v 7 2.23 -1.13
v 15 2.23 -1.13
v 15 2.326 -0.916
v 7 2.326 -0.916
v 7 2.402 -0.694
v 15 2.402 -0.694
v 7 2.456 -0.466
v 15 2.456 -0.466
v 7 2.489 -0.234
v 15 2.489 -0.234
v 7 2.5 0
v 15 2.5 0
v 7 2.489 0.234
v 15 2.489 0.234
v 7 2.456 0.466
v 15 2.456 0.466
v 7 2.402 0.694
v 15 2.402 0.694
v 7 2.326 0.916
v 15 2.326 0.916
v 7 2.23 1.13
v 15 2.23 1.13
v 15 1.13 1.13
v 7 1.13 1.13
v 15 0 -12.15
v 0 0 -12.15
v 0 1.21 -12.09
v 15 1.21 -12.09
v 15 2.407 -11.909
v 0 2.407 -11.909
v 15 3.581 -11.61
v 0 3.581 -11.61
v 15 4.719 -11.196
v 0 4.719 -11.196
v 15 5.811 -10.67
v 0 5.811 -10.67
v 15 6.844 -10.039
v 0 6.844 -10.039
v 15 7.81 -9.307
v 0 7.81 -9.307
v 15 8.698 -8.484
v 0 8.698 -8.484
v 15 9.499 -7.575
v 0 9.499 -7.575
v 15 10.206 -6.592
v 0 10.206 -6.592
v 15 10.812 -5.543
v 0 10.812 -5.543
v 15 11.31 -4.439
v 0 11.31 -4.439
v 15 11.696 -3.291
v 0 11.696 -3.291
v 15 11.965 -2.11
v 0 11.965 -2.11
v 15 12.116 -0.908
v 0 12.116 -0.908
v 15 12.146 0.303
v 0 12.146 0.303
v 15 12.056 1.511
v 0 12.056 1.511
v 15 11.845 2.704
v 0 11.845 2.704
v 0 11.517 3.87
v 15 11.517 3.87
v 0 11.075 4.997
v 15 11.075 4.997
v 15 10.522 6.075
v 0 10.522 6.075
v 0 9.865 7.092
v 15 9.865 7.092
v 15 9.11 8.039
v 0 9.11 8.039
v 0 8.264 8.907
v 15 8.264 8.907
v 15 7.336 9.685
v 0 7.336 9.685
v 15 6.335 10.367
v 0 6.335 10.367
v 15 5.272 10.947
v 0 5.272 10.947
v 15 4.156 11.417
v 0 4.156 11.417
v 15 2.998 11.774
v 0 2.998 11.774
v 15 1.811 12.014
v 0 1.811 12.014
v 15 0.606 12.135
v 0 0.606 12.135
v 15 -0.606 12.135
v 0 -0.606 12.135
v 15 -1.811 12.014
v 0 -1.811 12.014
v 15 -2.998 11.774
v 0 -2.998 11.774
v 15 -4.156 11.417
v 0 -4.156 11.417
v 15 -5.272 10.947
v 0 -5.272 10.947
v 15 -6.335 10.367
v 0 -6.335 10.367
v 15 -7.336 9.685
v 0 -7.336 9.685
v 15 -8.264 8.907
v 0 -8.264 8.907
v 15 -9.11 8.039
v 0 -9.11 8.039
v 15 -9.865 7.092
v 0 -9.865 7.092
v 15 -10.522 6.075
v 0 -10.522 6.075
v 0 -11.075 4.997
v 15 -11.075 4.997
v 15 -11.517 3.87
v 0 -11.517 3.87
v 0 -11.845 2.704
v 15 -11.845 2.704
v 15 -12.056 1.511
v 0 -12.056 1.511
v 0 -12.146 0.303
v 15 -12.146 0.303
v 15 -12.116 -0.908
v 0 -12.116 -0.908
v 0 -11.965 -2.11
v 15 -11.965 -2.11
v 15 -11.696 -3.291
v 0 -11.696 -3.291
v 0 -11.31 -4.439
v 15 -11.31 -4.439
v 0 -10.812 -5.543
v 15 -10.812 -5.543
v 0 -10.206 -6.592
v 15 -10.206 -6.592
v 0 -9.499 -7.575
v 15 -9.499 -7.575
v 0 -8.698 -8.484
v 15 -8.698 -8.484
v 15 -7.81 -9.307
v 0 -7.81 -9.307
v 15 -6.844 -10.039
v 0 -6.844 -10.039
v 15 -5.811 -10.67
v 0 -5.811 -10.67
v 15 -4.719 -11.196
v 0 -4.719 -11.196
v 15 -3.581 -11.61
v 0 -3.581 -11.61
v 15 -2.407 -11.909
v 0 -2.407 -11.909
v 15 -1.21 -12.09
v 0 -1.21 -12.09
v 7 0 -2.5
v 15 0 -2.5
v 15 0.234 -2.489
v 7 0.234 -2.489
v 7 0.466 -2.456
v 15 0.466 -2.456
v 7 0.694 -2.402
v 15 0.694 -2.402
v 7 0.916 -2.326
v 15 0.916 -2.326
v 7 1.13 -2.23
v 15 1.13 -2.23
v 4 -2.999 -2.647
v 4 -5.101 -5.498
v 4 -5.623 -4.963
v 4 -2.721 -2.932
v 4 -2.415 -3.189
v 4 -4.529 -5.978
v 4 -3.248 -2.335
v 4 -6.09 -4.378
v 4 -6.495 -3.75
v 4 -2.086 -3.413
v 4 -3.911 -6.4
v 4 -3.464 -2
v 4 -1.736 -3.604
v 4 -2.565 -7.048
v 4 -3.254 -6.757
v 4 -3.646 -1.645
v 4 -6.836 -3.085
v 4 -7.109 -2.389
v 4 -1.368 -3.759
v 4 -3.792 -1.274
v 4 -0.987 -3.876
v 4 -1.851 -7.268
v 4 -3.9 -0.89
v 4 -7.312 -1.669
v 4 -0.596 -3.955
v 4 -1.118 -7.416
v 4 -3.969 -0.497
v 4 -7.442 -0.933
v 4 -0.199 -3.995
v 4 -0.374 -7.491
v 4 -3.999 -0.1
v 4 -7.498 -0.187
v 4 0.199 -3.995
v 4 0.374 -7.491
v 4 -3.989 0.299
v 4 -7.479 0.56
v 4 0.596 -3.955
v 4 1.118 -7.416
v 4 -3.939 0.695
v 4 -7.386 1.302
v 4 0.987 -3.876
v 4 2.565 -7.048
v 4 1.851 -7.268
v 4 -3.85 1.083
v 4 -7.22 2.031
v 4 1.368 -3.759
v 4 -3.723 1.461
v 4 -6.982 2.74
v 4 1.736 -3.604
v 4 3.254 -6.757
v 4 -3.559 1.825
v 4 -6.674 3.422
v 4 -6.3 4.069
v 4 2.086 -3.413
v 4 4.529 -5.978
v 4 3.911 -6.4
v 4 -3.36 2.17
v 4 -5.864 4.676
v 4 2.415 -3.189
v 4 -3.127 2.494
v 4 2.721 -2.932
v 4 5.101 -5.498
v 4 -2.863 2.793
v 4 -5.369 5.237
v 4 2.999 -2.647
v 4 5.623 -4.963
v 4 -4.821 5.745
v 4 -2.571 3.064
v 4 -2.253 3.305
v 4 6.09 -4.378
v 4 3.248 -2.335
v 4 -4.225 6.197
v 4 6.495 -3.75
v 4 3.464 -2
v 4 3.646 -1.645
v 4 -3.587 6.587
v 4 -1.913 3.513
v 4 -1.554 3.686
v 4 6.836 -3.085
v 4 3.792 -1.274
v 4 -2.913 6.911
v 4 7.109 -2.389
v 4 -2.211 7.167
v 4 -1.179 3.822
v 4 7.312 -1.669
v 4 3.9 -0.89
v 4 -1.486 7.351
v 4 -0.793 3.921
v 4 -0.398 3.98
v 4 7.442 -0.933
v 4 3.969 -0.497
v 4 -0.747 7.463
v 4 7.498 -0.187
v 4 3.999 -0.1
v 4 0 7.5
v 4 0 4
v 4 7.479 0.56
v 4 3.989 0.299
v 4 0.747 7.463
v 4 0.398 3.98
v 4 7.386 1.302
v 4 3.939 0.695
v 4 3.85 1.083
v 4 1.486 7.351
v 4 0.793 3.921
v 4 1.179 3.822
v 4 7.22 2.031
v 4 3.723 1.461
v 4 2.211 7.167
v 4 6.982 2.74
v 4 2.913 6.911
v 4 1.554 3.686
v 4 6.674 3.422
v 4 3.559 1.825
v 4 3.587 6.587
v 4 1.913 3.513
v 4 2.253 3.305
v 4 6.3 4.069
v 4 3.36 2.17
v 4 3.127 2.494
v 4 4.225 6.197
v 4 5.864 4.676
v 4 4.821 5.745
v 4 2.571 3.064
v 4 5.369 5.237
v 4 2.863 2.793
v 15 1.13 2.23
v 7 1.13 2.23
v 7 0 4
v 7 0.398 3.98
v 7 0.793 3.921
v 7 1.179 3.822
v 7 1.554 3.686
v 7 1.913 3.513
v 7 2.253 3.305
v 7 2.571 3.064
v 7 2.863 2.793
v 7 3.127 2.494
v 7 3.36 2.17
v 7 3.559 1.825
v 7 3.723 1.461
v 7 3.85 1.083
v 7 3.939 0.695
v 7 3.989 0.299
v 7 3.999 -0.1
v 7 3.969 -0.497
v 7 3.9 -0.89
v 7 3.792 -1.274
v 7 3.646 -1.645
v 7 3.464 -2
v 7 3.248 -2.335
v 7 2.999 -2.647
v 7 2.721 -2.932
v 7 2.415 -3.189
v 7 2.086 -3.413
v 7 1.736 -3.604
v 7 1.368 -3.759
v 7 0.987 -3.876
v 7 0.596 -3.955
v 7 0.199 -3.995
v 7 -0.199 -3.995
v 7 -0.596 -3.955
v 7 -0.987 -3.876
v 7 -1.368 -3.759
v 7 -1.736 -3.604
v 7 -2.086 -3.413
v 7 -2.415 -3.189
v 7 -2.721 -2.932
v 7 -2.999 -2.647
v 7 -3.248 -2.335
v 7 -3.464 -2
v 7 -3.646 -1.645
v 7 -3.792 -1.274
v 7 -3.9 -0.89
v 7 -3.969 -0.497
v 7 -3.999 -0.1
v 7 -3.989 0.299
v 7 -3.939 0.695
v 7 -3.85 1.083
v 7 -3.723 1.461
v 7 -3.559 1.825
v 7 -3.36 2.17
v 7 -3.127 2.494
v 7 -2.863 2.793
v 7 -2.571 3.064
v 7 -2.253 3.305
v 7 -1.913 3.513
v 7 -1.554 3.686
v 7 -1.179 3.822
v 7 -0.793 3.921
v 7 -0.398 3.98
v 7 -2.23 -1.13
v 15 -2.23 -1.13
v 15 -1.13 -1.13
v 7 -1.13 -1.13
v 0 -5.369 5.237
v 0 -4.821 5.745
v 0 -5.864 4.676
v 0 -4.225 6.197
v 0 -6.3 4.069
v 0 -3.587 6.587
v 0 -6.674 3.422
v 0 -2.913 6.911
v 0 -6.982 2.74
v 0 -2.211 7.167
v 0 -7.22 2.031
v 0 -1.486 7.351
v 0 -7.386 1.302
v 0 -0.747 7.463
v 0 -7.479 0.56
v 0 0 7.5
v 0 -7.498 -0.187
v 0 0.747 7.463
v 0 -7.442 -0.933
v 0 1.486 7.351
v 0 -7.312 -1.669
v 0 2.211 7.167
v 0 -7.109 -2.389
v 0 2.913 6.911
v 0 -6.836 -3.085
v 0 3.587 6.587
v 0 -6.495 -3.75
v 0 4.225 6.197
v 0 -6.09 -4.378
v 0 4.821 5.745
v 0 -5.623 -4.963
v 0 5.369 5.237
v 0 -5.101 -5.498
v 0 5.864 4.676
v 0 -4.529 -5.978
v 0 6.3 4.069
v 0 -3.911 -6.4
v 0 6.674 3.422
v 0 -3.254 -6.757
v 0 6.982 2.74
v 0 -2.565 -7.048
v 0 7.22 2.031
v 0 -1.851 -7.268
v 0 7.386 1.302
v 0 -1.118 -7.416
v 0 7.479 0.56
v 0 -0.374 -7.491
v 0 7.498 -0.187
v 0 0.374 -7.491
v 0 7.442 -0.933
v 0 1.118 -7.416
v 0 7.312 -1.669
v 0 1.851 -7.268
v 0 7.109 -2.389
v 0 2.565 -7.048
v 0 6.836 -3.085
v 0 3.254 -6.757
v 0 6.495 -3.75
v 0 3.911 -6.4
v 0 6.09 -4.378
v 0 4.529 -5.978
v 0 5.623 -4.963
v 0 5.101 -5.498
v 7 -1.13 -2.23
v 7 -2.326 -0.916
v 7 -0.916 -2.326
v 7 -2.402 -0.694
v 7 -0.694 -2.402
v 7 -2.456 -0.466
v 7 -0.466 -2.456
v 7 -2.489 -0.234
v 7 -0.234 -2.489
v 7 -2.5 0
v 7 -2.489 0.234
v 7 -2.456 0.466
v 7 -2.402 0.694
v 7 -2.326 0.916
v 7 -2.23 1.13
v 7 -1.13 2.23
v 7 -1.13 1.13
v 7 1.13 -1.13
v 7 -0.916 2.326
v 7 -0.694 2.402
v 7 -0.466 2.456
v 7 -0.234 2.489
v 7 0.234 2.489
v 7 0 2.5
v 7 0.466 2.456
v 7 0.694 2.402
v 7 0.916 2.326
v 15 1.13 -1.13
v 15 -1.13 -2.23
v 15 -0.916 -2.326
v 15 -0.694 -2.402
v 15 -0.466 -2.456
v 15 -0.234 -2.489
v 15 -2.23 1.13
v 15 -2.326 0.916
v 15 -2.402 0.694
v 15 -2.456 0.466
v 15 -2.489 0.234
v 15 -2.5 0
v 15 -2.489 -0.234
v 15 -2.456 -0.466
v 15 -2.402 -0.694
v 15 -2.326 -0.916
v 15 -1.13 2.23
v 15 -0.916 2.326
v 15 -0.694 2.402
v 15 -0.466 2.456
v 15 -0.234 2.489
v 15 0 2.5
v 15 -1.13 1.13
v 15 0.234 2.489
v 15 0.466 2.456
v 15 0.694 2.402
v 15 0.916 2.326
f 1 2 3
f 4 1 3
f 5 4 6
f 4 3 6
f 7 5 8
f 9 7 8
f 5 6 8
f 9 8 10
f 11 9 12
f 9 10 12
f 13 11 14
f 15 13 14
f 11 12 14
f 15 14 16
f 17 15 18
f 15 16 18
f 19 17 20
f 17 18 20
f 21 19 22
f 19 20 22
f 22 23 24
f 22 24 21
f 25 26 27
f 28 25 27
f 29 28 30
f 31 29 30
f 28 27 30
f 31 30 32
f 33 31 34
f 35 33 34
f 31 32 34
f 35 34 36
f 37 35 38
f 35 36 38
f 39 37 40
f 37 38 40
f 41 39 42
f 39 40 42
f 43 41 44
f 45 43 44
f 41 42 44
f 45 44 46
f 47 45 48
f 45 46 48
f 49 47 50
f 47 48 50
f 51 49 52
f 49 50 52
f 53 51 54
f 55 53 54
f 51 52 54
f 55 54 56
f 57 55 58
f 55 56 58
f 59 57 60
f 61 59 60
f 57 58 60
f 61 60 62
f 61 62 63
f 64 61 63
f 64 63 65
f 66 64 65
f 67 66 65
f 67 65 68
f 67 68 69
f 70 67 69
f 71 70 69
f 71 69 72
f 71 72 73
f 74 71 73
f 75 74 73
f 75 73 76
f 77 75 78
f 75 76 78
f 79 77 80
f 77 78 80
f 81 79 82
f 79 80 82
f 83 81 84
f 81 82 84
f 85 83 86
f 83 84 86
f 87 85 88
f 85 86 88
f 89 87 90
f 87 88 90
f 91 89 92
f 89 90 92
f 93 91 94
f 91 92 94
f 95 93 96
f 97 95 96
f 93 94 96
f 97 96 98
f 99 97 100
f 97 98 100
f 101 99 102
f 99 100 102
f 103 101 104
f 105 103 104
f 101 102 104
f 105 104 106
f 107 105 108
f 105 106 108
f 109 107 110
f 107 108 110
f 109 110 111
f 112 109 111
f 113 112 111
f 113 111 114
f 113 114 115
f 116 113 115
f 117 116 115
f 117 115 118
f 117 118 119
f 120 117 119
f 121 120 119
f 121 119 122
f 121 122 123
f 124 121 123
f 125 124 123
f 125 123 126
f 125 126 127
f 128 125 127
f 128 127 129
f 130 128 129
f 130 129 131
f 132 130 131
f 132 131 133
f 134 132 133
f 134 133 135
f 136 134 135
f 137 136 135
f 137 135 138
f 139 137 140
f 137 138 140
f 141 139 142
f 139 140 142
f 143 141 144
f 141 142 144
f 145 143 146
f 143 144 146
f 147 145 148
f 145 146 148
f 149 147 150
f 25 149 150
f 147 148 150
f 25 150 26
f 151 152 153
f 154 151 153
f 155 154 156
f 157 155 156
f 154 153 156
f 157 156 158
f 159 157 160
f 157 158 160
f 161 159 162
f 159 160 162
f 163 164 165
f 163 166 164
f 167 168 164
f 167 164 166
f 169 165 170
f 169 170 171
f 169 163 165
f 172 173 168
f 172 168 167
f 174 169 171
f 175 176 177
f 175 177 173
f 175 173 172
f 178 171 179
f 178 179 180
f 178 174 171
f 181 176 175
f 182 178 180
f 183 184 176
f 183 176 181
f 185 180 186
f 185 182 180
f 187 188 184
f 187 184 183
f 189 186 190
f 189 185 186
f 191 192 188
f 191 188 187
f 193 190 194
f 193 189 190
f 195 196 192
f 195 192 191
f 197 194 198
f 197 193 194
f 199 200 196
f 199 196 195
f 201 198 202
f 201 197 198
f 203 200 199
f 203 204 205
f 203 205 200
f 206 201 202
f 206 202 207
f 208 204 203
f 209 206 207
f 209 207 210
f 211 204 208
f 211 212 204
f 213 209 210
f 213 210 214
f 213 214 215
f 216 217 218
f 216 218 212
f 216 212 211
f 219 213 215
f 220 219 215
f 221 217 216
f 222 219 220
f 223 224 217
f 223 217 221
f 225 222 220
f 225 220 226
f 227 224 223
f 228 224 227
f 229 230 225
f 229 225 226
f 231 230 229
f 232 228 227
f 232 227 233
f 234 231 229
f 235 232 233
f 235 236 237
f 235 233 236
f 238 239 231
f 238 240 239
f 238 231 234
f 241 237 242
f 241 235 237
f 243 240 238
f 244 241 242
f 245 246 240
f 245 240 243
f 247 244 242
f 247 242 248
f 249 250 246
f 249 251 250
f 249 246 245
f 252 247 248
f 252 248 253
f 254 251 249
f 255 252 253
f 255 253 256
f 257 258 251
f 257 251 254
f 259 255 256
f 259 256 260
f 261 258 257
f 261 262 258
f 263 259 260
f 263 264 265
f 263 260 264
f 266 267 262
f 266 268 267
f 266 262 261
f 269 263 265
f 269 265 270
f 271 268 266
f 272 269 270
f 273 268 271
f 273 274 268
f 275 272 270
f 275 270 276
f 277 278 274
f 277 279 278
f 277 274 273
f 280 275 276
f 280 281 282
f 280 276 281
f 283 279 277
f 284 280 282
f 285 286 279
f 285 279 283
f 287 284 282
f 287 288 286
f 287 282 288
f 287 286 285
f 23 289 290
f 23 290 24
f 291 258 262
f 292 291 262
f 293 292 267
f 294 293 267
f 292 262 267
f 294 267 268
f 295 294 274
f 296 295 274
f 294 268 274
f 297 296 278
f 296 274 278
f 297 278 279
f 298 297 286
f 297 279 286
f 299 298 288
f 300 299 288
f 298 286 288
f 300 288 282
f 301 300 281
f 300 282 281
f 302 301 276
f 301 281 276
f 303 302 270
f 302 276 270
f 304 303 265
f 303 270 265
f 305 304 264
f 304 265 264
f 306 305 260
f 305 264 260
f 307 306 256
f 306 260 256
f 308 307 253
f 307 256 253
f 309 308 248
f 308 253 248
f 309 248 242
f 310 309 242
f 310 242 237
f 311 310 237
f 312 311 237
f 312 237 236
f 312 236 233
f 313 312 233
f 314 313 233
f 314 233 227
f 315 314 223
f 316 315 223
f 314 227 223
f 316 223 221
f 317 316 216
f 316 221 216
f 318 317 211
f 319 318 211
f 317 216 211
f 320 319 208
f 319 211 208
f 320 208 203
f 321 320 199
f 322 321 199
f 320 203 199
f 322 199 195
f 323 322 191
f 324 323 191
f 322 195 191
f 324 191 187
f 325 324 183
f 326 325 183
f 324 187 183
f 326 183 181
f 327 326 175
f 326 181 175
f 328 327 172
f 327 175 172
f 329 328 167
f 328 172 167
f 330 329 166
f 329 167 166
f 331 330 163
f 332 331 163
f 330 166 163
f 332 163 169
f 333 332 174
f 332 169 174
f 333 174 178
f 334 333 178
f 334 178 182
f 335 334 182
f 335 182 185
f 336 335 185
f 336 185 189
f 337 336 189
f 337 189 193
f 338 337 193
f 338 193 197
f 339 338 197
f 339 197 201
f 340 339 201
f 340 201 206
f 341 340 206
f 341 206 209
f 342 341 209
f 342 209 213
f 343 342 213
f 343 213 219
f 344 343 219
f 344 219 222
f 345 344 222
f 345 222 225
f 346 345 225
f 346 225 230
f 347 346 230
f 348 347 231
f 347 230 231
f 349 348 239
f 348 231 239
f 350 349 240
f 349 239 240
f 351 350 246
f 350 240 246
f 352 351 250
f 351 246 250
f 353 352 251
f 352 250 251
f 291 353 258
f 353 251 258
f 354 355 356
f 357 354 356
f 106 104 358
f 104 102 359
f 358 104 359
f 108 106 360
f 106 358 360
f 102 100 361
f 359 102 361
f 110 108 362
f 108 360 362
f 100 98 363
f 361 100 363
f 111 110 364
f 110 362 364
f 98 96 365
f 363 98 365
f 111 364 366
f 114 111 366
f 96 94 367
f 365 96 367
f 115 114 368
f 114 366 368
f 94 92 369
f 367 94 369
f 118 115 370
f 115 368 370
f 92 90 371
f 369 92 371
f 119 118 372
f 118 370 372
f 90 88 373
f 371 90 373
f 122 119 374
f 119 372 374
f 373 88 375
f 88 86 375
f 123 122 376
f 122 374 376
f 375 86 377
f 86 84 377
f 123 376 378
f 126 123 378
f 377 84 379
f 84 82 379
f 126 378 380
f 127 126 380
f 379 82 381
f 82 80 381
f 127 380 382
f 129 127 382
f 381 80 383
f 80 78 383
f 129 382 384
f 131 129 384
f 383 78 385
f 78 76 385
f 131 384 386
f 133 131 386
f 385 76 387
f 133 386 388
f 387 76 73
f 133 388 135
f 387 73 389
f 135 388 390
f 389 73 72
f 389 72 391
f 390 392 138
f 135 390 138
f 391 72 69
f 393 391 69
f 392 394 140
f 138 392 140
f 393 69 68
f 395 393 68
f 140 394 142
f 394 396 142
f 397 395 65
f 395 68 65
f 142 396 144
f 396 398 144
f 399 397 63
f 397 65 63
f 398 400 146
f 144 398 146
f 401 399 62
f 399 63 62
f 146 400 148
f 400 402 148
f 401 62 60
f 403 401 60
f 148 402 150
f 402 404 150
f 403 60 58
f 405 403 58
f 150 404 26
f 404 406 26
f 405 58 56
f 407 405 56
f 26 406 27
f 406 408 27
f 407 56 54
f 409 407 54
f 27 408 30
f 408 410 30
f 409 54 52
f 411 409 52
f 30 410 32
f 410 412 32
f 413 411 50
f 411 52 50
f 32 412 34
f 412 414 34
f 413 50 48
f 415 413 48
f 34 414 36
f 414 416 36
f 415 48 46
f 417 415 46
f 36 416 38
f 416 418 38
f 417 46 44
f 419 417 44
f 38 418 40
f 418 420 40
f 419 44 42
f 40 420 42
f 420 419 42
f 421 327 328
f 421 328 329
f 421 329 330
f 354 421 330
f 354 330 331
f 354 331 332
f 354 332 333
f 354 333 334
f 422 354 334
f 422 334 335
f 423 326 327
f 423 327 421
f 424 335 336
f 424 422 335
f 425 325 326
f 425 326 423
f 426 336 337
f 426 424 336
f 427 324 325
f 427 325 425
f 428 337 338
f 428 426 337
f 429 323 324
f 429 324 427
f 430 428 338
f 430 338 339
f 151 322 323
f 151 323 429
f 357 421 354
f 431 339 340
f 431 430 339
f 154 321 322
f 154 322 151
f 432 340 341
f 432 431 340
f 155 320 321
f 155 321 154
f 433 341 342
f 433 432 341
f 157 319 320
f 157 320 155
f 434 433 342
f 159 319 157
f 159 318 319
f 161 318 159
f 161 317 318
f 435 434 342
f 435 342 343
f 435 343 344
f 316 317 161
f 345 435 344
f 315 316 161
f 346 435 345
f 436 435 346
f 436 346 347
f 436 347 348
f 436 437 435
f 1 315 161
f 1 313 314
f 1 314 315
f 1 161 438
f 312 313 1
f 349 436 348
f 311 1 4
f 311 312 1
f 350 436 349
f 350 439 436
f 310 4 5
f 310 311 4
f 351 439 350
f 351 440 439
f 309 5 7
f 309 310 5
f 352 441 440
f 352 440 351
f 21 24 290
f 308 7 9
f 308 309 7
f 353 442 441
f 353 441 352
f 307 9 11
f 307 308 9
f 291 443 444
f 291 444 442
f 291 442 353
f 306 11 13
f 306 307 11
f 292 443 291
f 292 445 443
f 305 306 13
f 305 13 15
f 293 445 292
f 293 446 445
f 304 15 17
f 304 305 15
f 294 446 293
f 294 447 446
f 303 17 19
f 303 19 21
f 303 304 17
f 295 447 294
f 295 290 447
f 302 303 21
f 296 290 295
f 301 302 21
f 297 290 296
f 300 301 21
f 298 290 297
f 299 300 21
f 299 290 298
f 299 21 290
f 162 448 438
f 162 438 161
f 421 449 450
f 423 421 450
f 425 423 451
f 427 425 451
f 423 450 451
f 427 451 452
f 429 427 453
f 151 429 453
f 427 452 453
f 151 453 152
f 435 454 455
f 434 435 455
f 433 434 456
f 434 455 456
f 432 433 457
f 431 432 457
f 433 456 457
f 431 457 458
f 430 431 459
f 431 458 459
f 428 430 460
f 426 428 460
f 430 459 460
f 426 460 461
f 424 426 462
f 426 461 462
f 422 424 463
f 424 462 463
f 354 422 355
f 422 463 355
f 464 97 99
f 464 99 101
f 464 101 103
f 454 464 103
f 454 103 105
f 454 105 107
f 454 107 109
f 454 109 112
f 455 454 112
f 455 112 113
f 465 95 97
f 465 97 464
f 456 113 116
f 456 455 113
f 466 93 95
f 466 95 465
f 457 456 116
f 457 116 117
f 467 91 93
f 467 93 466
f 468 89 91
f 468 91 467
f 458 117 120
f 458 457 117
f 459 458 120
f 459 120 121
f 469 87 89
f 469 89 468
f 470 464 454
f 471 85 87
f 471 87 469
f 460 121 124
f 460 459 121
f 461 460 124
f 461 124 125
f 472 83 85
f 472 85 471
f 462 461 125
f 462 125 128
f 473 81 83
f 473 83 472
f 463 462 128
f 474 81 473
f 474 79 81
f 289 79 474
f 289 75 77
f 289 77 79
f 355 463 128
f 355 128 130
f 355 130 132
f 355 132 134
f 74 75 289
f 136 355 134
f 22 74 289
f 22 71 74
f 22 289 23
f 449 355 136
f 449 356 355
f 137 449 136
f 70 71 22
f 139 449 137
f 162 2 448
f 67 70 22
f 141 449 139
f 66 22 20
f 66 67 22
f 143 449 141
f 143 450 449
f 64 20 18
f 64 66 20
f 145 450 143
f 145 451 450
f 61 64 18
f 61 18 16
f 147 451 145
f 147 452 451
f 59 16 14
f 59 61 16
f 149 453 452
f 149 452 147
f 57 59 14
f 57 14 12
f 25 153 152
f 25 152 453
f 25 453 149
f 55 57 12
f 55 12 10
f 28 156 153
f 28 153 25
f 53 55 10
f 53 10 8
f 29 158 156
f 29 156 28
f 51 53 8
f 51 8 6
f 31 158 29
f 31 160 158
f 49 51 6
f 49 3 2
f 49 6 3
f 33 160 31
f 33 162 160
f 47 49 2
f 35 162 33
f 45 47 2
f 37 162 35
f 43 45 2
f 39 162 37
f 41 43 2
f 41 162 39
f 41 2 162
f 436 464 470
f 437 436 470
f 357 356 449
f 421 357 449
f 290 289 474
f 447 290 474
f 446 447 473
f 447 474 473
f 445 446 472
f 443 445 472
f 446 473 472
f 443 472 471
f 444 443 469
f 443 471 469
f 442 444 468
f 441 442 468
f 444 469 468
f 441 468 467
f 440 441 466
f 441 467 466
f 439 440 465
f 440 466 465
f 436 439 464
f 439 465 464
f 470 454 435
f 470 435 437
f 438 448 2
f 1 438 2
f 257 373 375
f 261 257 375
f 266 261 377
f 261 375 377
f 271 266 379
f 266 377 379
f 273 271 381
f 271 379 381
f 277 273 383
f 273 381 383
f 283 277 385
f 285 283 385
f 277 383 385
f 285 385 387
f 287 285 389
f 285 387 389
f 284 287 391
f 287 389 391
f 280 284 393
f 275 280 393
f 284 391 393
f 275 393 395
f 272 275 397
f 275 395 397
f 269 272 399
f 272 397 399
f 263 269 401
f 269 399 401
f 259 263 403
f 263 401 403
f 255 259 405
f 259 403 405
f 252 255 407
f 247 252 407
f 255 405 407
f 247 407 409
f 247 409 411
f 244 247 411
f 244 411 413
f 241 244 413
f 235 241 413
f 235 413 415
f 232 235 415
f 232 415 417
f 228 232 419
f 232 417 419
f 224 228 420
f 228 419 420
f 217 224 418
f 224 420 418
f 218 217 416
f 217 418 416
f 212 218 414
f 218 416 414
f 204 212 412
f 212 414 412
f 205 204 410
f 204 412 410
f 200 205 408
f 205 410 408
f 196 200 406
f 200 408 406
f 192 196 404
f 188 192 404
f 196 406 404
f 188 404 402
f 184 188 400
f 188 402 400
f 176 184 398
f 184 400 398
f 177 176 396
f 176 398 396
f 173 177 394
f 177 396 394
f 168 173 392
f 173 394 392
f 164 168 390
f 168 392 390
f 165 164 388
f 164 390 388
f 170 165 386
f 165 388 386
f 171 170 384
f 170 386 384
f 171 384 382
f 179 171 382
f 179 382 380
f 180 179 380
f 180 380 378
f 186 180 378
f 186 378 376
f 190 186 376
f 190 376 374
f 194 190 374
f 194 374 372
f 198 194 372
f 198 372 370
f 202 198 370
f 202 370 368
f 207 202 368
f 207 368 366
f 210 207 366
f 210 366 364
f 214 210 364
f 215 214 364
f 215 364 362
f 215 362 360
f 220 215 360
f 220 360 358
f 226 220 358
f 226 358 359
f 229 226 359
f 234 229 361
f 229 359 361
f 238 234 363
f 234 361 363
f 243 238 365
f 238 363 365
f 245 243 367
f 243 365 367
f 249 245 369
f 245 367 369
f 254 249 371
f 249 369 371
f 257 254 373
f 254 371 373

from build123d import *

# Parameters (mm, degrees)
SKETCH_1_R          = 12.15
EXTRUDE_1_DEPTH     = 15
SKETCH_2_W          = 2.260059524
SKETCH_2_H          = 1.1
SKETCH_2_W_2        = 1.1
SKETCH_2_H_2        = 2.260059524
CUT_EXTRUDE_1_DEPTH = 23.80887985
SKETCH_3_R          = 7.5
CUT_EXTRUDE_2_DEPTH = 4
SKETCH_4_R          = 4
CUT_EXTRUDE_3_DEPTH = 3


with BuildPart() as part:
    # 草图1 → 凸台-拉伸1 (new body)
    with BuildSketch(Plane(origin=(0, 0, 0), x_dir=(0, 0, -1), z_dir=(1, 0, 0))):
        Circle(SKETCH_1_R)
    extrude(amount=EXTRUDE_1_DEPTH)

    # 草图2 → 切除-拉伸1 (cut, through all)
    with BuildSketch(Plane(origin=(15, 0, 0), x_dir=(0, 0, -1), z_dir=(1, 0, 0))):
        with Locations((0, 1.680029762)):
            Rectangle(SKETCH_2_W, SKETCH_2_H)
        with Locations((-1.680029762, 0)):
            Rectangle(SKETCH_2_W_2, SKETCH_2_H_2)
        with Locations((0, -1.680029762)):
            Rectangle(SKETCH_2_W, SKETCH_2_H)
        with Locations((1.680029762, 0)):
            Rectangle(SKETCH_2_W_2, SKETCH_2_H_2)
        Rectangle(SKETCH_2_W, SKETCH_2_H_2)
        with BuildLine():
            ThreePointArc((1.130029762, 2.230029762), (0, 2.5), (-1.130029762, 2.230029762))
            Line((-1.130029762, 2.230029762), (1.130029762, 2.230029762))
        make_face()
        with BuildLine():
            ThreePointArc((2.5, 0), (2.431570933, 0.580915483), (2.230029762, 1.130029762))
            Line((2.230029762, 1.130029762), (2.230029762, -1.130029762))
            ThreePointArc((2.230029762, -1.130029762), (2.431570933, -0.580915483), (2.5, 0))
        make_face()
        with BuildLine():
            Line((1.130029762, -2.230029762), (-1.130029762, -2.230029762))
            ThreePointArc((-1.130029762, -2.230029762), (0, -2.5), (1.130029762, -2.230029762))
        make_face()
        with BuildLine():
            Line((-2.230029762, -1.130029762), (-2.230029762, 1.130029762))
            ThreePointArc((-2.230029762, 1.130029762), (-2.5, 0), (-2.230029762, -1.130029762))
        make_face()
    extrude(amount=-CUT_EXTRUDE_1_DEPTH, mode=Mode.SUBTRACT)

    # 草图3 → 切除-拉伸2 (cut)
    with BuildSketch(Plane.ZY):
        Circle(SKETCH_3_R)
    extrude(amount=-CUT_EXTRUDE_2_DEPTH, mode=Mode.SUBTRACT)

    # 草图4 → 切除-拉伸3 (cut)
    with BuildSketch(Plane.ZY.offset(-4)):
        Circle(SKETCH_4_R)
    extrude(amount=-CUT_EXTRUDE_3_DEPTH, mode=Mode.SUBTRACT)


solid = part.part
